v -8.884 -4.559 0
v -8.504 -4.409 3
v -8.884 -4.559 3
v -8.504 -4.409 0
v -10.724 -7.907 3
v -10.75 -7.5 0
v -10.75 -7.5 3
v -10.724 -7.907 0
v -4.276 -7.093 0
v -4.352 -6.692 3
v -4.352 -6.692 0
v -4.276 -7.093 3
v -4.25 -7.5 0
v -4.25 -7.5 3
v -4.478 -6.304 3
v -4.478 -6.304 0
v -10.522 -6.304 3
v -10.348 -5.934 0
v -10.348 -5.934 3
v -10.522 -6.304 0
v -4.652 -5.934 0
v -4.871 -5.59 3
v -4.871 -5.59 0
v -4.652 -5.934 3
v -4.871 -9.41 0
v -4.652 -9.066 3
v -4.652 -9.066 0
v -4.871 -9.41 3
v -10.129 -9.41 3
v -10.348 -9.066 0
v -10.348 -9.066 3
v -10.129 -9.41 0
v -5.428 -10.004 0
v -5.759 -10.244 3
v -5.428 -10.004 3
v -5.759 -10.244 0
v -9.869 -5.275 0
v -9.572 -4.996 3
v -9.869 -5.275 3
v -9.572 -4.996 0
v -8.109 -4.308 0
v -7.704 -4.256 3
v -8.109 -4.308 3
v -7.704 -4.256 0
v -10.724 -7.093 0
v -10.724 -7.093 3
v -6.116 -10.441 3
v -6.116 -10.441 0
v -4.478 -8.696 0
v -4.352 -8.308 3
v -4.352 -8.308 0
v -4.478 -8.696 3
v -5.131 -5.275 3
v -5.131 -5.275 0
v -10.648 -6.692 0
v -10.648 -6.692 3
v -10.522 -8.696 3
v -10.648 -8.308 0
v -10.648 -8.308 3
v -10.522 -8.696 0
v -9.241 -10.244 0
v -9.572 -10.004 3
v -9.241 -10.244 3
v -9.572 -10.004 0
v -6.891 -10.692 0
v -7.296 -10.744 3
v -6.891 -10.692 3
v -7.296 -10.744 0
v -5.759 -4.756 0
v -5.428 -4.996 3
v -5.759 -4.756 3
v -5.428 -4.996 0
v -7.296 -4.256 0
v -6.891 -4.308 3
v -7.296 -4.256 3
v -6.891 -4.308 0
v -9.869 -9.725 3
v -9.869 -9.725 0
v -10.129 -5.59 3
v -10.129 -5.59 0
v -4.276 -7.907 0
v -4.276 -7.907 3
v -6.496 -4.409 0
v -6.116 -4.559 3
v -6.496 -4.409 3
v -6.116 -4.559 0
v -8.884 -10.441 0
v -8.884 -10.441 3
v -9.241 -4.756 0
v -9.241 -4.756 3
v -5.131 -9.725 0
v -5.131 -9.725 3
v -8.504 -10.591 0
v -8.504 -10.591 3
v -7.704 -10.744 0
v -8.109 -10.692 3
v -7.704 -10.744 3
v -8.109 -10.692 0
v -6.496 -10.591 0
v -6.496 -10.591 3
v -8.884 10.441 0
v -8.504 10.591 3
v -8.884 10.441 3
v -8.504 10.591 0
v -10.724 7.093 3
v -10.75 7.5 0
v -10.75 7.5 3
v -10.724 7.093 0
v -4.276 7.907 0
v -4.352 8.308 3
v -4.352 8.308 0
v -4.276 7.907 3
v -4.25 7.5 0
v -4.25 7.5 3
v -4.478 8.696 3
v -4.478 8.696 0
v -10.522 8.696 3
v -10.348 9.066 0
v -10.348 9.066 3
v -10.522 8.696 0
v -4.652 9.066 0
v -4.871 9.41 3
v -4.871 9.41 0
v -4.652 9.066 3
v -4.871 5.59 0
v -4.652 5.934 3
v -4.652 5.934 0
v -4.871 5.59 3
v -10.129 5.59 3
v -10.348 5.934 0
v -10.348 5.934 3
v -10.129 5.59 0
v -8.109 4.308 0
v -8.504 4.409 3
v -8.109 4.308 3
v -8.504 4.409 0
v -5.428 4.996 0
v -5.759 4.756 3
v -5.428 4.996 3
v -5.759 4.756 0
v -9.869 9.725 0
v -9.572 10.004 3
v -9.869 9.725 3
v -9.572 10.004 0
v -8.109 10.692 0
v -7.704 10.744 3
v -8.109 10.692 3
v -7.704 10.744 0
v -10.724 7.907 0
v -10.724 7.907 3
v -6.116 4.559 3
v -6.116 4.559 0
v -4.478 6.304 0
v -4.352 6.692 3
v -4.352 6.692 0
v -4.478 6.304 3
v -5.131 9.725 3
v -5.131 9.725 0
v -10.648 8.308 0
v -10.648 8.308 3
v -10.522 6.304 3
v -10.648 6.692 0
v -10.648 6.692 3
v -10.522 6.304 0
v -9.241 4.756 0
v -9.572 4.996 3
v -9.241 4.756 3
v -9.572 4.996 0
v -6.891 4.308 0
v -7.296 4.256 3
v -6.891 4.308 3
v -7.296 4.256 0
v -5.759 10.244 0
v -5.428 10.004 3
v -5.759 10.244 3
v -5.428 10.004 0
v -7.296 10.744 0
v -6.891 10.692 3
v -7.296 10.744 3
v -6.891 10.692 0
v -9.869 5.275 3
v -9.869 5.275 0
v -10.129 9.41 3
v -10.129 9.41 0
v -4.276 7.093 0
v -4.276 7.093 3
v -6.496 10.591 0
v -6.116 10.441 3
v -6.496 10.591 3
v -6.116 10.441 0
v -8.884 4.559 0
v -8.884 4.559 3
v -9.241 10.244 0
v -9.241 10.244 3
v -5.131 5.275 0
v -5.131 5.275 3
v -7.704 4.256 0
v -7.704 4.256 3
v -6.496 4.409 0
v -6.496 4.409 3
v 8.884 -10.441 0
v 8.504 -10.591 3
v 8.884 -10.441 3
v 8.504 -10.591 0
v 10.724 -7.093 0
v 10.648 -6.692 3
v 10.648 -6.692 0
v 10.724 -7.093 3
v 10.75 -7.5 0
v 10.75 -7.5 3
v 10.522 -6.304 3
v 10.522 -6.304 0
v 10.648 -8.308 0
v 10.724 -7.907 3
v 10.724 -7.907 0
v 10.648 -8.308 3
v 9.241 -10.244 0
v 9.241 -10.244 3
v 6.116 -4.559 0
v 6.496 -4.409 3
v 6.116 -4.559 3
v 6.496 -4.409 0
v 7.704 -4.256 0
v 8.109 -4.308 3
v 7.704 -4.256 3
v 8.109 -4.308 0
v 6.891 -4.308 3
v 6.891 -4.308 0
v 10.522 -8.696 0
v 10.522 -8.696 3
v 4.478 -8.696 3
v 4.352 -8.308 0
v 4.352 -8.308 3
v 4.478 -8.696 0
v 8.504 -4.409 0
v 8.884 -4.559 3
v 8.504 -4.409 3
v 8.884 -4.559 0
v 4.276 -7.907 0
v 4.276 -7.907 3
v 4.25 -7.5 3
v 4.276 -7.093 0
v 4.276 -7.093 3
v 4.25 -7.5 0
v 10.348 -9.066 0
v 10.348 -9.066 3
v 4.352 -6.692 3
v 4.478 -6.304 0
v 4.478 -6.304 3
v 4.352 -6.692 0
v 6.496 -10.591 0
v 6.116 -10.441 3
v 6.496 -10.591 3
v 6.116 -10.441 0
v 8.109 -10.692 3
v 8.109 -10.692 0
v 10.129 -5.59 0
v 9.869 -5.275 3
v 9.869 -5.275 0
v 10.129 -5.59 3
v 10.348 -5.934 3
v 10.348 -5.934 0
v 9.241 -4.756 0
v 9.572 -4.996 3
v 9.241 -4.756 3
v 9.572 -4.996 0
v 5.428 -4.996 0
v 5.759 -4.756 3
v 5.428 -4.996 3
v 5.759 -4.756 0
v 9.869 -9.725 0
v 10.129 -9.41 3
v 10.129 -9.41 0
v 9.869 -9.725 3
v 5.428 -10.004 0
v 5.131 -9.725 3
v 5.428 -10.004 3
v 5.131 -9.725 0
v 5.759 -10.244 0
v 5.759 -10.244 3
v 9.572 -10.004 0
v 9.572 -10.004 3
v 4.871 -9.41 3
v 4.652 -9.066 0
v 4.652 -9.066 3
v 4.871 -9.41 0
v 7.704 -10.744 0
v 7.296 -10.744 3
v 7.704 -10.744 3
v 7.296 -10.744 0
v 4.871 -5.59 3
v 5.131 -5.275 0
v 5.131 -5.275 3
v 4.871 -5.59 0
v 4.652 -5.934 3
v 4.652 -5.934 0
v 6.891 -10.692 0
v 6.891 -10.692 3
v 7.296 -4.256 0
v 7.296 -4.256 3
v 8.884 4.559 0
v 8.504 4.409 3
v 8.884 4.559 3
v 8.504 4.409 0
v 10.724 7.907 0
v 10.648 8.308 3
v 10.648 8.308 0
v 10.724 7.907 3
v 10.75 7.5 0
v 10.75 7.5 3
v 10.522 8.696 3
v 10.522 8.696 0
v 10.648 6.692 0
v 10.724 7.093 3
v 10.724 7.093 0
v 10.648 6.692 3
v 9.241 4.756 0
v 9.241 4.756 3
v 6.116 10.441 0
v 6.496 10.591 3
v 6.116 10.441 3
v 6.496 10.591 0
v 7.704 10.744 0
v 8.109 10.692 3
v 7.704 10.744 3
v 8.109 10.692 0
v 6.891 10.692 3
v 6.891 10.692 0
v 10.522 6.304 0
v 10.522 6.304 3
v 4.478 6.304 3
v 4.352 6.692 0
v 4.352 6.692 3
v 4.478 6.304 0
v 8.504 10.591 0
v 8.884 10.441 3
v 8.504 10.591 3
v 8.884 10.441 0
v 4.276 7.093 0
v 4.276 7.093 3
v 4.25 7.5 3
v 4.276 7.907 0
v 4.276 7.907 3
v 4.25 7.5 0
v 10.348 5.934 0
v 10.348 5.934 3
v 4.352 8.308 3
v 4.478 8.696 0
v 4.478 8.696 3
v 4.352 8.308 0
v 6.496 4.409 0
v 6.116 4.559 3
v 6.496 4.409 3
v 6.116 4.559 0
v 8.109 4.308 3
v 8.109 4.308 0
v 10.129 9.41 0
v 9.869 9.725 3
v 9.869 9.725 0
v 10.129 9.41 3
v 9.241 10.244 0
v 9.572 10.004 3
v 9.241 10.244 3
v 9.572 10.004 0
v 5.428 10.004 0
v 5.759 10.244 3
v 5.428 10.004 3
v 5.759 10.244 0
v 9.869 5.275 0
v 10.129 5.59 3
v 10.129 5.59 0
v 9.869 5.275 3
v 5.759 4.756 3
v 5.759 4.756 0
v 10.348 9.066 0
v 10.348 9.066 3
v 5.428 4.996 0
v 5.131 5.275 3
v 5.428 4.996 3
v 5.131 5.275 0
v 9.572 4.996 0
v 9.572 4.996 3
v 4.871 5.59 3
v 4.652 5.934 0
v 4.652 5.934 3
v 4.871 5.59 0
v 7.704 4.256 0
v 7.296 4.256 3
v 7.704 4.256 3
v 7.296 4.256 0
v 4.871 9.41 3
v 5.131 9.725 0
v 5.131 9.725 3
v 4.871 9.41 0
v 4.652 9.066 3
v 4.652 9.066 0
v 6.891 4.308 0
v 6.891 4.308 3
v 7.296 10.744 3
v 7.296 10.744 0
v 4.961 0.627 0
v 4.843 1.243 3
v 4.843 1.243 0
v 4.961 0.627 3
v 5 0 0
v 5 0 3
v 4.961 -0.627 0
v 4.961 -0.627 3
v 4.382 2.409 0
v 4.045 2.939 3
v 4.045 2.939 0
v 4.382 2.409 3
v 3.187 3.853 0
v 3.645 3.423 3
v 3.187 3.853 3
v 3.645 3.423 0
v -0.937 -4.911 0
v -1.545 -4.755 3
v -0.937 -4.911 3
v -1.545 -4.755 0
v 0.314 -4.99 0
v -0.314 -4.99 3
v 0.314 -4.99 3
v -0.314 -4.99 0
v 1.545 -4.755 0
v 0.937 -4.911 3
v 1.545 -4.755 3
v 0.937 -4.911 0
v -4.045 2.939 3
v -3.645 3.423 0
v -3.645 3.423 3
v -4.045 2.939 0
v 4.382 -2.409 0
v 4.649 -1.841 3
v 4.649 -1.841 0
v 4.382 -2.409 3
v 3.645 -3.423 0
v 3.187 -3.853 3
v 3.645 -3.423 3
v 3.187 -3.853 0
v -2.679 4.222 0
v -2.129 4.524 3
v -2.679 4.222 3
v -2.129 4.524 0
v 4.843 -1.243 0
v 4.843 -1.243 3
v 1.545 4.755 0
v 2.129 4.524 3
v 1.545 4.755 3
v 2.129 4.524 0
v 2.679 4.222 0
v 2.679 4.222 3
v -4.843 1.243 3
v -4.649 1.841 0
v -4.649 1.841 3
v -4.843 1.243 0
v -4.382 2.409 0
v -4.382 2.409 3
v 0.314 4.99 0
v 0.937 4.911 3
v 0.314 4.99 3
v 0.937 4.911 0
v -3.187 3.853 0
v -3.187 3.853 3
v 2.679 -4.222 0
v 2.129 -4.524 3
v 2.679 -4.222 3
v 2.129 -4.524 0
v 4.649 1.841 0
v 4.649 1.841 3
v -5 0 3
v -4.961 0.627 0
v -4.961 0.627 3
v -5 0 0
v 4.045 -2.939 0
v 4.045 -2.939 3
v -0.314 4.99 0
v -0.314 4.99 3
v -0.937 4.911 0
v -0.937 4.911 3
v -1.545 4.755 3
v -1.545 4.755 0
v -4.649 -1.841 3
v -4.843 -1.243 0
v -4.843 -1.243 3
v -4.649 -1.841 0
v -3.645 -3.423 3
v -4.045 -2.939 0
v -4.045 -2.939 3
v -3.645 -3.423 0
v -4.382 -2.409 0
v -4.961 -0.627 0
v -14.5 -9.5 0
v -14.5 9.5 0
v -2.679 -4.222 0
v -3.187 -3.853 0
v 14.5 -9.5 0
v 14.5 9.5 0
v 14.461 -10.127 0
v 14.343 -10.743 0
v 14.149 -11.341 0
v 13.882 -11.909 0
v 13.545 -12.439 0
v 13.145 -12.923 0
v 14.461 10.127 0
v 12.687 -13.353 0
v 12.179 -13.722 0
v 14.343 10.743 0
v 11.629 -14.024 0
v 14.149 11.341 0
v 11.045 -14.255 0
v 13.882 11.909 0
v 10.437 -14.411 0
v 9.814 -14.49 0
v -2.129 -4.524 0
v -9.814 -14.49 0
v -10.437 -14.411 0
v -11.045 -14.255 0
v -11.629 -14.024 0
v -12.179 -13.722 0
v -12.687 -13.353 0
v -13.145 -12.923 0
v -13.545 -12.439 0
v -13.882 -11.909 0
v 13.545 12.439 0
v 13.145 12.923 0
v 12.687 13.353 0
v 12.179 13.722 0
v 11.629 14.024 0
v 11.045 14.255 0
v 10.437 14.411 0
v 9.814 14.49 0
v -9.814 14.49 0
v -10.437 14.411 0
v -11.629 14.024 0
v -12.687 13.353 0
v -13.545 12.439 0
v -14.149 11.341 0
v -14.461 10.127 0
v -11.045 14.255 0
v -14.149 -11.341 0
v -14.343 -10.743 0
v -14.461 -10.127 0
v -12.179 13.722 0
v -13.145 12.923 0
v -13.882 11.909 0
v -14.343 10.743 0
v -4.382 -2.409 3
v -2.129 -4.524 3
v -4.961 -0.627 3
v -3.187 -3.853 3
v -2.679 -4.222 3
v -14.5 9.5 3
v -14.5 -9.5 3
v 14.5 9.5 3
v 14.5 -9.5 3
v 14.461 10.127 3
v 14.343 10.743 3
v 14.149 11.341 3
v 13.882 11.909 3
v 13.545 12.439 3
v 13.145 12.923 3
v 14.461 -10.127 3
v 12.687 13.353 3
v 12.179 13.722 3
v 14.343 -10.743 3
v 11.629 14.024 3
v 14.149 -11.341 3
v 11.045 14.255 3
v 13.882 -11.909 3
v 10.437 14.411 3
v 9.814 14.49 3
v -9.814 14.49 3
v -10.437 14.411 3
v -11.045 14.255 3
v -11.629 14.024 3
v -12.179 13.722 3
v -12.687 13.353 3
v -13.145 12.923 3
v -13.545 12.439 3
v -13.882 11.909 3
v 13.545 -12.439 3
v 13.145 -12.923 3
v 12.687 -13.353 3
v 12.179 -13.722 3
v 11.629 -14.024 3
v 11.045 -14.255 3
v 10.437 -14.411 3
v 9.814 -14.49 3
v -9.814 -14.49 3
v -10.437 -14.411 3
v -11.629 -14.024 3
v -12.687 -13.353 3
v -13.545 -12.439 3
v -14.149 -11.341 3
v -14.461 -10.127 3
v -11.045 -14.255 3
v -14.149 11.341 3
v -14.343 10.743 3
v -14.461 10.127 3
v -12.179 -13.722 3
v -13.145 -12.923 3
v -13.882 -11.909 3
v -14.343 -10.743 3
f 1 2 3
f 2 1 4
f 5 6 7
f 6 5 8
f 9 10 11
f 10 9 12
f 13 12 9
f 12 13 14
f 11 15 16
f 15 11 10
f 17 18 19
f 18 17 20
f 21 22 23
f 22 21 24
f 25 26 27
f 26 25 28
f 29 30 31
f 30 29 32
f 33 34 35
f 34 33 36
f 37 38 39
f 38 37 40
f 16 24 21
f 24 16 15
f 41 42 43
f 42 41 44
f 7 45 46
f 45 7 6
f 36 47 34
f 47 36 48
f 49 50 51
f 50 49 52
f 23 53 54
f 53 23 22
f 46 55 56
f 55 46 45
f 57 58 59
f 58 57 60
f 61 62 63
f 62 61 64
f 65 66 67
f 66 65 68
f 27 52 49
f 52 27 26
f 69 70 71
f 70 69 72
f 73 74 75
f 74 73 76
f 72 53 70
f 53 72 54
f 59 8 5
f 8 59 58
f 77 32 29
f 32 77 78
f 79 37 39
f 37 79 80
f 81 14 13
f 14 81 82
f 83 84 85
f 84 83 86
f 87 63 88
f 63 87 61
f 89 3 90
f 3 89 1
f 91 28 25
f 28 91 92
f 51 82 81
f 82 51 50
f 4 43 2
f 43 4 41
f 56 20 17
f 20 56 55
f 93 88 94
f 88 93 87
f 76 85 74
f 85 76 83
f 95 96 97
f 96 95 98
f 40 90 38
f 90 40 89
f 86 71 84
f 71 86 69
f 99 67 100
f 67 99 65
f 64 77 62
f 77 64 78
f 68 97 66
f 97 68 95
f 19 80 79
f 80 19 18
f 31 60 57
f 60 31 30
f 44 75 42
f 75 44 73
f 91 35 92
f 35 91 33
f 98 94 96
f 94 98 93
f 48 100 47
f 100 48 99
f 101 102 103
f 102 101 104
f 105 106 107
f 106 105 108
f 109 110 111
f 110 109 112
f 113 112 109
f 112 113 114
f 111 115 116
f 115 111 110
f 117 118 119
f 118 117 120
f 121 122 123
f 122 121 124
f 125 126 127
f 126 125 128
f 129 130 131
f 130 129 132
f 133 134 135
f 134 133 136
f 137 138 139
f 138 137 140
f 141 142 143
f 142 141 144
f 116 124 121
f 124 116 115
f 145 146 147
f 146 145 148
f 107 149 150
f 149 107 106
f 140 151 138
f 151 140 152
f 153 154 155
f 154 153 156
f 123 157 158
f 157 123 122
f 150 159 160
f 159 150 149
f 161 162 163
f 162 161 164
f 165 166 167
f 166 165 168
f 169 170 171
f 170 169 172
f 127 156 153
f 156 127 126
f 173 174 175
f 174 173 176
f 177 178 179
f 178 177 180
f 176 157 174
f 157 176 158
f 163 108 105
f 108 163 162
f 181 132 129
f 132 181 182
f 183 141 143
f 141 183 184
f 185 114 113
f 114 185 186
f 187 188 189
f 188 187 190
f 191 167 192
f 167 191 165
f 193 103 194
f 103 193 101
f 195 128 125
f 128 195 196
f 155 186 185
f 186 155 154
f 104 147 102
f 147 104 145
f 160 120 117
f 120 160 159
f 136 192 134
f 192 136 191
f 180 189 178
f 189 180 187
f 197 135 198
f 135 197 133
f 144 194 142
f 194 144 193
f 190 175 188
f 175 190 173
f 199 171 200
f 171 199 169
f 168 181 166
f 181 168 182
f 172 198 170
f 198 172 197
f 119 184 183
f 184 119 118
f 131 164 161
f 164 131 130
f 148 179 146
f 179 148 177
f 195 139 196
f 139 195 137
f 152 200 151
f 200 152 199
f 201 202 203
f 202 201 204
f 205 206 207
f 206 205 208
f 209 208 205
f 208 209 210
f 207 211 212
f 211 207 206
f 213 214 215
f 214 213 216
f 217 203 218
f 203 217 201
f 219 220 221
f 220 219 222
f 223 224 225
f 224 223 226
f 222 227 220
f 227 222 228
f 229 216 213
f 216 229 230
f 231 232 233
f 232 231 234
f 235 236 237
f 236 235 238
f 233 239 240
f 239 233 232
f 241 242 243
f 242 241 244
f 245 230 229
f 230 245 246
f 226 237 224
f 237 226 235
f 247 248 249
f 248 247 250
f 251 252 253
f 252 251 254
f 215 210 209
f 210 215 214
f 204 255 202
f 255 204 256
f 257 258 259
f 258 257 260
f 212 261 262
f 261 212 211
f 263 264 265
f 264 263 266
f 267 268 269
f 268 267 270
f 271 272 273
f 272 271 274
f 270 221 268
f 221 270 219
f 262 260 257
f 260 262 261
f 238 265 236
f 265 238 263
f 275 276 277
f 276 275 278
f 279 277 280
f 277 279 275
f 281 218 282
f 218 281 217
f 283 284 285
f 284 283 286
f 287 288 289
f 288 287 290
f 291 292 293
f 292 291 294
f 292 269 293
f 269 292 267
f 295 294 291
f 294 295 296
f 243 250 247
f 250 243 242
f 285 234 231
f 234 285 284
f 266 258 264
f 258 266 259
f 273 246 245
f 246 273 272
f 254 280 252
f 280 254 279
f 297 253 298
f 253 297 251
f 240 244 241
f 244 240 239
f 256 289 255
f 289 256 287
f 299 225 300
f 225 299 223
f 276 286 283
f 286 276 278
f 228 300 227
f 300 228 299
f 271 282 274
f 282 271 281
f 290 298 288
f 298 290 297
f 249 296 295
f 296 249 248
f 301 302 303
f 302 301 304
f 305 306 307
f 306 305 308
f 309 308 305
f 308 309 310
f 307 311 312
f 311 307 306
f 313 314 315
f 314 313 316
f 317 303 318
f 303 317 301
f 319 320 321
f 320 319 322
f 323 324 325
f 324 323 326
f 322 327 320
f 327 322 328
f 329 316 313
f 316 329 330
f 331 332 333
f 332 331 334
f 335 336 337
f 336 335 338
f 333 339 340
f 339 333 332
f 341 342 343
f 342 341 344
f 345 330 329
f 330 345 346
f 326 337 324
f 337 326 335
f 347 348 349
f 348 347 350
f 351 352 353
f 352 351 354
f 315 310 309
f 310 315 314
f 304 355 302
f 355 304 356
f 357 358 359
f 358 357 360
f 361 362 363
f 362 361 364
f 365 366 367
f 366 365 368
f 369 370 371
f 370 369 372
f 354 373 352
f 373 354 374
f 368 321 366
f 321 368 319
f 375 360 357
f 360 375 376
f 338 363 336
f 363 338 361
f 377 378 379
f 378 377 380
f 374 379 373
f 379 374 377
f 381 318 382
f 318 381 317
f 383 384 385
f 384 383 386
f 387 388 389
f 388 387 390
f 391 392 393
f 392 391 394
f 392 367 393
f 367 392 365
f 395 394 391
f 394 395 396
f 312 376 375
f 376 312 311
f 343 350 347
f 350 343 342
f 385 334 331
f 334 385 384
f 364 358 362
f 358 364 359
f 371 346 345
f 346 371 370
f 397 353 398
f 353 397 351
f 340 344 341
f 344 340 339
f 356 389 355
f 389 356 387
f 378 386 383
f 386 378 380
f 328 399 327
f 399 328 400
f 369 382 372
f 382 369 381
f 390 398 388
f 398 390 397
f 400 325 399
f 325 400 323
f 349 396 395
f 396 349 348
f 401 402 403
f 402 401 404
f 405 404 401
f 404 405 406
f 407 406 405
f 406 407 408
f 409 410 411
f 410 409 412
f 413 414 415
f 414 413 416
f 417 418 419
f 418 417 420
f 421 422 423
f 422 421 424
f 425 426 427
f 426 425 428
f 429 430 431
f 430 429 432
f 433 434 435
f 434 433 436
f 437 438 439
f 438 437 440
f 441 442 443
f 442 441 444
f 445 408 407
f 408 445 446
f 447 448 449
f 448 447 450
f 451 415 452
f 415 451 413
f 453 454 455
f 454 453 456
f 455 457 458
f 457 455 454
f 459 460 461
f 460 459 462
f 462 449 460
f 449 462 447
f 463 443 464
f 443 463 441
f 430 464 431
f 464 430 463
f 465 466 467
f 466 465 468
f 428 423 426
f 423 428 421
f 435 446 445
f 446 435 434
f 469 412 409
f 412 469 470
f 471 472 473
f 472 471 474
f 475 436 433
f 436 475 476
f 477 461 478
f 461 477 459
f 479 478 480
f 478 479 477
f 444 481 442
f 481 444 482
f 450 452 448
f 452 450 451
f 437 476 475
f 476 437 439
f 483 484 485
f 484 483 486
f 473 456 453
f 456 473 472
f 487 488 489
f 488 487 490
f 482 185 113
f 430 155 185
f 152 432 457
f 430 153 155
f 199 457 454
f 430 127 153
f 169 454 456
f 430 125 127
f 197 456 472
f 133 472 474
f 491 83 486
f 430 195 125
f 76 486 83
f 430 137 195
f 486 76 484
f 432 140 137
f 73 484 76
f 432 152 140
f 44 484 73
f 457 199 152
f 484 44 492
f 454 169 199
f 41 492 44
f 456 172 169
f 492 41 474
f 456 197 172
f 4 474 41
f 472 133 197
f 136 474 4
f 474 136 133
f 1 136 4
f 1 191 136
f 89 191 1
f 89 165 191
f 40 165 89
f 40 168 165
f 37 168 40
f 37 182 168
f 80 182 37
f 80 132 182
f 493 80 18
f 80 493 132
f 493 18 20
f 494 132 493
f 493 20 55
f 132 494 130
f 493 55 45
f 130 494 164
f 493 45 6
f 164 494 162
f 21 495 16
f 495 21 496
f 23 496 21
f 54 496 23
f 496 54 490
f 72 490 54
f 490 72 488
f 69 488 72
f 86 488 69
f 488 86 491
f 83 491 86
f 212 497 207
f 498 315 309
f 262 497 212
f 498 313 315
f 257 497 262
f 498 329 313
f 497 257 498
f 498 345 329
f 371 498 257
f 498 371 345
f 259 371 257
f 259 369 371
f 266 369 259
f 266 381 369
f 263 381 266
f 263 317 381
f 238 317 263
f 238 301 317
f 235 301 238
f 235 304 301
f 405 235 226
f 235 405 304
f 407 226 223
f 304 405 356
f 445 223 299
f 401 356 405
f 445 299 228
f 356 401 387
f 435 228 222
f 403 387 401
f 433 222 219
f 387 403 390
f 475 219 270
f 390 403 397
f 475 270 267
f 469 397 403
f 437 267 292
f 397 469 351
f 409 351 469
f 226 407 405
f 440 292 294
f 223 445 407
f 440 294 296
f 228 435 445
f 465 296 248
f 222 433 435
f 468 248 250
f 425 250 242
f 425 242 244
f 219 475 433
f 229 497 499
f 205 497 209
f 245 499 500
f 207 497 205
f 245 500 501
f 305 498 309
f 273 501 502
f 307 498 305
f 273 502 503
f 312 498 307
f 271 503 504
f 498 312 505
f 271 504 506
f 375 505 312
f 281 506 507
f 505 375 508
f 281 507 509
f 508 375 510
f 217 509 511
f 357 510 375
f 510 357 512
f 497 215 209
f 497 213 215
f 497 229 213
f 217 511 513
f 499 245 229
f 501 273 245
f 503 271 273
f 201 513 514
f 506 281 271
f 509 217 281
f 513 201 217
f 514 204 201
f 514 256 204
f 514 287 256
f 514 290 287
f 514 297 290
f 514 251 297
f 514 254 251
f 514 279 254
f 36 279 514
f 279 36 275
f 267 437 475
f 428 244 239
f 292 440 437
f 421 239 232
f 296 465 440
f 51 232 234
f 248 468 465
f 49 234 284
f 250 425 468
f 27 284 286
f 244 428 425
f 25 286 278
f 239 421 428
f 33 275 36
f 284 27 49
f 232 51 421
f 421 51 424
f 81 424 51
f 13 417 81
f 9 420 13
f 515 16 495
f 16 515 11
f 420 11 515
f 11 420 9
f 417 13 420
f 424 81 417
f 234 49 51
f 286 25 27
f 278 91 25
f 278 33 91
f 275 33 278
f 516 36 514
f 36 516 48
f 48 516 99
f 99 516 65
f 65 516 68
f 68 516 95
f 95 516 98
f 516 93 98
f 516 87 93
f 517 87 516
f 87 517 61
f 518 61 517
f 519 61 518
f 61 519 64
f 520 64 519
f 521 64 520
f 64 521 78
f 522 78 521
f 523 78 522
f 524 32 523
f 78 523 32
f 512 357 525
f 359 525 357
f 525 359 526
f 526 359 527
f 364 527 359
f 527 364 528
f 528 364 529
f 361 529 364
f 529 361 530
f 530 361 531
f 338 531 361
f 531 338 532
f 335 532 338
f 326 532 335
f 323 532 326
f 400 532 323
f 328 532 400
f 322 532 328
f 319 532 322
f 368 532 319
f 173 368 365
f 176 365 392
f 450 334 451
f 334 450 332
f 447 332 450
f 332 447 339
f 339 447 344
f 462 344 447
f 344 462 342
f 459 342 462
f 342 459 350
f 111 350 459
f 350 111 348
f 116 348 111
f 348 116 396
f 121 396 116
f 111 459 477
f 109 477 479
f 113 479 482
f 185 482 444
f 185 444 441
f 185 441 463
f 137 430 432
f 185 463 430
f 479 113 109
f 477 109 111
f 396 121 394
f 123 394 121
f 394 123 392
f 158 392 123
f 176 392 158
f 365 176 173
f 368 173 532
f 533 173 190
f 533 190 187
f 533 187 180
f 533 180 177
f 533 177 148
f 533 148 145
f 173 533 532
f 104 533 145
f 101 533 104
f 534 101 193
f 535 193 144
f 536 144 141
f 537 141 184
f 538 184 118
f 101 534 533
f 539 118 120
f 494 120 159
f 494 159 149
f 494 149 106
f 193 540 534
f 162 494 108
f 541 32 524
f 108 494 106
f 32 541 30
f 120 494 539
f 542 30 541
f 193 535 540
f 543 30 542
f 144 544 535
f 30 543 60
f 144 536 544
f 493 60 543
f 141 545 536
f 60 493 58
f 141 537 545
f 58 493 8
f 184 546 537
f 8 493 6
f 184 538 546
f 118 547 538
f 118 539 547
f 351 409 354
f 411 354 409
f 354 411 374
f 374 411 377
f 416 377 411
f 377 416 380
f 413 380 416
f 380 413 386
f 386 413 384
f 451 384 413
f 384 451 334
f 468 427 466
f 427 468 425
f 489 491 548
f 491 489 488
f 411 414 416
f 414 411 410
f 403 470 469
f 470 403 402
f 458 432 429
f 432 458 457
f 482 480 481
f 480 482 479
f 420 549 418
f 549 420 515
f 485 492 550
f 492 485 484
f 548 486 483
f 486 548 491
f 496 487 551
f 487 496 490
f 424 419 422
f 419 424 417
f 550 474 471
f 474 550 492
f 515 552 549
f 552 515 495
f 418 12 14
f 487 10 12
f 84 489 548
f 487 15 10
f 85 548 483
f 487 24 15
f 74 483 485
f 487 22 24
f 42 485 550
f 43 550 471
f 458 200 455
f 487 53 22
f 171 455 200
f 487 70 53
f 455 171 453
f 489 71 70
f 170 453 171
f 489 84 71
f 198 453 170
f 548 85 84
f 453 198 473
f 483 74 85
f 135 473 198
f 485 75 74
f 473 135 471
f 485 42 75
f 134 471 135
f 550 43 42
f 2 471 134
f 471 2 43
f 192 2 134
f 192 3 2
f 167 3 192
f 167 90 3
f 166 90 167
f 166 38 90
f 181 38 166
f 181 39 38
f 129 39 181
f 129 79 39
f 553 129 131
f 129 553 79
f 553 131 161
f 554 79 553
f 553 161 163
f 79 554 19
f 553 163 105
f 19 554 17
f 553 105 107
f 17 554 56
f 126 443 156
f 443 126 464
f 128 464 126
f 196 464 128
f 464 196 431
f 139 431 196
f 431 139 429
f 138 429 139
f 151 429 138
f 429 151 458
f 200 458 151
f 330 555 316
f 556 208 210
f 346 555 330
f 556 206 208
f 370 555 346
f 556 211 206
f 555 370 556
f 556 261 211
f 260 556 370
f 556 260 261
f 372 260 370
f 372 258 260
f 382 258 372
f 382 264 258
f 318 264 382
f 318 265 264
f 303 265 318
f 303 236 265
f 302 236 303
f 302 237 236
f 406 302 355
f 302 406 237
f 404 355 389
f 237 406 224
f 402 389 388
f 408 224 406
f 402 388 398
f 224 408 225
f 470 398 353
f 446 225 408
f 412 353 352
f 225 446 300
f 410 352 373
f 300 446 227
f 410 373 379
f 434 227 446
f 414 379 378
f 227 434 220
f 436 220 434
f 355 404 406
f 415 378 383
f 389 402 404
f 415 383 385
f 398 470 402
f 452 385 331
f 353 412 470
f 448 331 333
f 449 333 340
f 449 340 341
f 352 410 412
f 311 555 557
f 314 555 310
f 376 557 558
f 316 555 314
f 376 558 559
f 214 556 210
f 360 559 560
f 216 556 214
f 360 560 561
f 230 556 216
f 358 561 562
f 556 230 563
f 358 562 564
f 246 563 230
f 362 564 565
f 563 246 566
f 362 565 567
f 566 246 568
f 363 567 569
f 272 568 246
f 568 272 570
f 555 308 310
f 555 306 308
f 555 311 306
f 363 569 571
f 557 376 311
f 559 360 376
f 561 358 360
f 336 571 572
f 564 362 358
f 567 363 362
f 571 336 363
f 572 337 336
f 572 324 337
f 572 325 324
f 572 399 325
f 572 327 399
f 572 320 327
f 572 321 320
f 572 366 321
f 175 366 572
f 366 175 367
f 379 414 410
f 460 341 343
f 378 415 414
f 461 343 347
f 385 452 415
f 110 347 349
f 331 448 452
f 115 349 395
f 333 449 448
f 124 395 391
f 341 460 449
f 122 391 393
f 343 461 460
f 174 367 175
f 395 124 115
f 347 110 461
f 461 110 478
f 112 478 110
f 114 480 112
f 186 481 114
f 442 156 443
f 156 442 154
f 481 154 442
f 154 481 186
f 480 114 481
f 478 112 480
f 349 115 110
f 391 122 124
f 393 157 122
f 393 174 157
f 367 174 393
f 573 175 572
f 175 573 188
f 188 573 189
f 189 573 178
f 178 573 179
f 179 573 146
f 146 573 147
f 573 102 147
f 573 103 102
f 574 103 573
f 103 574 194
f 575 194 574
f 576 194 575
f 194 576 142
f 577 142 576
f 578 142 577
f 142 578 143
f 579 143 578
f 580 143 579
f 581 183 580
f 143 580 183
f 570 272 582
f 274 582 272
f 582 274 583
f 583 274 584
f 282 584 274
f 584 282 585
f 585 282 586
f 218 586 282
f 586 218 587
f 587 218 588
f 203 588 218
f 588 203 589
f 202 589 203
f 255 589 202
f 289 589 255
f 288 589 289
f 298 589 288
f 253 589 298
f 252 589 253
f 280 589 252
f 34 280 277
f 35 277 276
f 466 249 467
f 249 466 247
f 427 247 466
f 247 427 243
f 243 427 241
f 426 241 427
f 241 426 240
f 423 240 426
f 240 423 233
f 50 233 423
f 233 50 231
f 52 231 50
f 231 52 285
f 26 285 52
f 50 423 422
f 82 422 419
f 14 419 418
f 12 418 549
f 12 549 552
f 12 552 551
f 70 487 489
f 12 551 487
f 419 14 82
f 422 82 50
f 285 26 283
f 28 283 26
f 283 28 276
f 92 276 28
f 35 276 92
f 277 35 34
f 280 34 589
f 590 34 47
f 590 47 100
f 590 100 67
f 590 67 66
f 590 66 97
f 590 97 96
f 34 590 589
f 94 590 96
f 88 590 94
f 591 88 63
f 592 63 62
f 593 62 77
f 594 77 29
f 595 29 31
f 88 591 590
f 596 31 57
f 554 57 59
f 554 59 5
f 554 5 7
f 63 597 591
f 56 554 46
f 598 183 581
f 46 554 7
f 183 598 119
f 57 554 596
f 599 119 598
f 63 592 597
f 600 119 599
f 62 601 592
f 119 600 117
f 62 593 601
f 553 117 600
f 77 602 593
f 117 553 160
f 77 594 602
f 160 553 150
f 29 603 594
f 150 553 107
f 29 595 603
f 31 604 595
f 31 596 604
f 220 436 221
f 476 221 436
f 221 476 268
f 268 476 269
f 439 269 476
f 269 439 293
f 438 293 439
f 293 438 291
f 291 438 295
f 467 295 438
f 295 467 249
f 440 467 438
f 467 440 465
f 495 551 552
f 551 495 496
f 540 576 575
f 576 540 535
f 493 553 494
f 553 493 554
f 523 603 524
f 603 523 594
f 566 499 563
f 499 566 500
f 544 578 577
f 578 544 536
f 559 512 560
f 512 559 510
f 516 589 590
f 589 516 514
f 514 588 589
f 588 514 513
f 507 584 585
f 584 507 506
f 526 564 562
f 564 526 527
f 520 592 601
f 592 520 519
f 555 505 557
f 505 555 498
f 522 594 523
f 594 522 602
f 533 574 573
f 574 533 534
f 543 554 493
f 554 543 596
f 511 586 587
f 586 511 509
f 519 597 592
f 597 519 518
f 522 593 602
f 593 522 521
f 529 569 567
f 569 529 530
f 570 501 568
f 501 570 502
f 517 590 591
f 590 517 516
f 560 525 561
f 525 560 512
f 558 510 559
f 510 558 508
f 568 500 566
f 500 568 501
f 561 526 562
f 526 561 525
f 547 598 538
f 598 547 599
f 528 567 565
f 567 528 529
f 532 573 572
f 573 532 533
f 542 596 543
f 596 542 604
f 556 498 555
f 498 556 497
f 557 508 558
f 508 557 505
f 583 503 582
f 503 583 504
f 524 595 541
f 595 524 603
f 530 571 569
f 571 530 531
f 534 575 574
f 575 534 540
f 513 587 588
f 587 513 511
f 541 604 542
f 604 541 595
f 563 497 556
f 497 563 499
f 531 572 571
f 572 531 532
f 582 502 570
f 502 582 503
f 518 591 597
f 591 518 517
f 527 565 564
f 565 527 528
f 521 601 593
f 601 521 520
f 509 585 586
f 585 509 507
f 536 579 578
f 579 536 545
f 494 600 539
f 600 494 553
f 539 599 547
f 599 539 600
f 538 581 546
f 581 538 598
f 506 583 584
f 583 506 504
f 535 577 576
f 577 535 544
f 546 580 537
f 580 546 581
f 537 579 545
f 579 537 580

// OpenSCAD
$fn = 50;

difference() {
	union() {
		hull() {
			translate(v = [-9.5, 9.5, 0]) {
				cylinder(h = 3, r = 5);
			}
			translate(v = [9.5, 9.5, 0]) {
				cylinder(h = 3, r = 5);
			}
			translate(v = [-9.5, -9.5, 0]) {
				cylinder(h = 3, r = 5);
			}
			translate(v = [9.5, -9.5, 0]) {
				cylinder(h = 3, r = 5);
			}
		}
	}
	union() {
		translate(v = [-7.5, -7.5, -100.0]) {
			cylinder(h = 200, r = 3.25);
		}
		translate(v = [-7.5, 7.5, -100.0]) {
			cylinder(h = 200, r = 3.25);
		}
		translate(v = [7.5, -7.5, -100.0]) {
			cylinder(h = 200, r = 3.25);
		}
		translate(v = [7.5, 7.5, -100.0]) {
			cylinder(h = 200, r = 3.25);
		}
		translate(v = [-7.5, -7.5, -100.0]) {
			cylinder(h = 200, r = 1.8);
		}
		translate(v = [-7.5, 7.5, -100.0]) {
			cylinder(h = 200, r = 1.8);
		}
		translate(v = [7.5, -7.5, -100.0]) {
			cylinder(h = 200, r = 1.8);
		}
		translate(v = [7.5, 7.5, -100.0]) {
			cylinder(h = 200, r = 1.8);
		}
		cylinder(h = 3, r = 5.0);
	}
}
